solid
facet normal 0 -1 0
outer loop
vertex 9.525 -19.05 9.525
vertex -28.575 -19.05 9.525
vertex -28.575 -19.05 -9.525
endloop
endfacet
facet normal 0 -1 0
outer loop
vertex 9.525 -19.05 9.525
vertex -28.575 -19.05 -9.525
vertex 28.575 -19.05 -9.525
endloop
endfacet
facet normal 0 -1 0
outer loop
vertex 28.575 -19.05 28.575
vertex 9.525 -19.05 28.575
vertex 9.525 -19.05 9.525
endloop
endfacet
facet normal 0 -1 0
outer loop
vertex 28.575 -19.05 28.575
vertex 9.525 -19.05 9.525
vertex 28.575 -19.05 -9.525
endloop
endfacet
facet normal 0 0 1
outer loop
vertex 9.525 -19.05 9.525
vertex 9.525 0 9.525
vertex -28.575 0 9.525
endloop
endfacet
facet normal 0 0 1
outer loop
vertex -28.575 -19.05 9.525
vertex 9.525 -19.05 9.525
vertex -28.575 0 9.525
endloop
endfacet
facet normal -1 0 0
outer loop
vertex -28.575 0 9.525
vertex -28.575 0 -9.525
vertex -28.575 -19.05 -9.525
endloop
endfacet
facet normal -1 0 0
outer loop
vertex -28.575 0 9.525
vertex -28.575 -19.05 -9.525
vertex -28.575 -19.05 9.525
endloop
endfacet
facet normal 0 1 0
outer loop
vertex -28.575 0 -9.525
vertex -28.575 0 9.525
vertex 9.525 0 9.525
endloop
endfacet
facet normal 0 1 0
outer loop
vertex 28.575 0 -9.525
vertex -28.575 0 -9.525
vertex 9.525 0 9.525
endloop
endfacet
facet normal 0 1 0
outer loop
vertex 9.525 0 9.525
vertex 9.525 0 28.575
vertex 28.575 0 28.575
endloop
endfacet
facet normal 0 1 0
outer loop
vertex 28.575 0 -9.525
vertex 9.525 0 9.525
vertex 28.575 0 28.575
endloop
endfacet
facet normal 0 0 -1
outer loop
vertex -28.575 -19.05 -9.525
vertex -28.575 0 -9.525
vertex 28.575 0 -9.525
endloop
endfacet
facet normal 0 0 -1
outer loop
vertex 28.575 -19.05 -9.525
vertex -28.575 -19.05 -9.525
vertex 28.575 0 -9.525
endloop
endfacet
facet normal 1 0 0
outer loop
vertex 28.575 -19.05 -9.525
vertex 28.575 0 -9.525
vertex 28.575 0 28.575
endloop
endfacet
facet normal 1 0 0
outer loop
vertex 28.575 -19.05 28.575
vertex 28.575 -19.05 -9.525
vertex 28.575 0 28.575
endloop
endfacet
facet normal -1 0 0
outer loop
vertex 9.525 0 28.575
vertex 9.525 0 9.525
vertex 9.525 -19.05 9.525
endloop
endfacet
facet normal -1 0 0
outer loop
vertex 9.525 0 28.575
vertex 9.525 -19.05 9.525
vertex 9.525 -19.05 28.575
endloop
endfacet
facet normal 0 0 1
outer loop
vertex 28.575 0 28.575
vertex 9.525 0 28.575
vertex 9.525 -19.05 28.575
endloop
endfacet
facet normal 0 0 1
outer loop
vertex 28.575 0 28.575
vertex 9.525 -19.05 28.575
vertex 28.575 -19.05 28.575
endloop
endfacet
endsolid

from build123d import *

# Parameters (mm, degrees)
F0_W     = 19.05
F0_H     = 19.05
F1_DEPTH = 19.05


with BuildPart() as f1:
    # F0 (on Front) → F1 (new body)
    with BuildSketch(Plane.XZ):
        Rectangle(F0_W, F0_H)
        with Locations((19.05, 0)):
            Rectangle(F0_W, F0_H)
        with Locations((19.05, 19.05)):
            Rectangle(F0_W, F0_H)
        with Locations((-19.05, 0)):
            Rectangle(F0_W, F0_H)
    extrude(amount=F1_DEPTH)


solid = f1.part
